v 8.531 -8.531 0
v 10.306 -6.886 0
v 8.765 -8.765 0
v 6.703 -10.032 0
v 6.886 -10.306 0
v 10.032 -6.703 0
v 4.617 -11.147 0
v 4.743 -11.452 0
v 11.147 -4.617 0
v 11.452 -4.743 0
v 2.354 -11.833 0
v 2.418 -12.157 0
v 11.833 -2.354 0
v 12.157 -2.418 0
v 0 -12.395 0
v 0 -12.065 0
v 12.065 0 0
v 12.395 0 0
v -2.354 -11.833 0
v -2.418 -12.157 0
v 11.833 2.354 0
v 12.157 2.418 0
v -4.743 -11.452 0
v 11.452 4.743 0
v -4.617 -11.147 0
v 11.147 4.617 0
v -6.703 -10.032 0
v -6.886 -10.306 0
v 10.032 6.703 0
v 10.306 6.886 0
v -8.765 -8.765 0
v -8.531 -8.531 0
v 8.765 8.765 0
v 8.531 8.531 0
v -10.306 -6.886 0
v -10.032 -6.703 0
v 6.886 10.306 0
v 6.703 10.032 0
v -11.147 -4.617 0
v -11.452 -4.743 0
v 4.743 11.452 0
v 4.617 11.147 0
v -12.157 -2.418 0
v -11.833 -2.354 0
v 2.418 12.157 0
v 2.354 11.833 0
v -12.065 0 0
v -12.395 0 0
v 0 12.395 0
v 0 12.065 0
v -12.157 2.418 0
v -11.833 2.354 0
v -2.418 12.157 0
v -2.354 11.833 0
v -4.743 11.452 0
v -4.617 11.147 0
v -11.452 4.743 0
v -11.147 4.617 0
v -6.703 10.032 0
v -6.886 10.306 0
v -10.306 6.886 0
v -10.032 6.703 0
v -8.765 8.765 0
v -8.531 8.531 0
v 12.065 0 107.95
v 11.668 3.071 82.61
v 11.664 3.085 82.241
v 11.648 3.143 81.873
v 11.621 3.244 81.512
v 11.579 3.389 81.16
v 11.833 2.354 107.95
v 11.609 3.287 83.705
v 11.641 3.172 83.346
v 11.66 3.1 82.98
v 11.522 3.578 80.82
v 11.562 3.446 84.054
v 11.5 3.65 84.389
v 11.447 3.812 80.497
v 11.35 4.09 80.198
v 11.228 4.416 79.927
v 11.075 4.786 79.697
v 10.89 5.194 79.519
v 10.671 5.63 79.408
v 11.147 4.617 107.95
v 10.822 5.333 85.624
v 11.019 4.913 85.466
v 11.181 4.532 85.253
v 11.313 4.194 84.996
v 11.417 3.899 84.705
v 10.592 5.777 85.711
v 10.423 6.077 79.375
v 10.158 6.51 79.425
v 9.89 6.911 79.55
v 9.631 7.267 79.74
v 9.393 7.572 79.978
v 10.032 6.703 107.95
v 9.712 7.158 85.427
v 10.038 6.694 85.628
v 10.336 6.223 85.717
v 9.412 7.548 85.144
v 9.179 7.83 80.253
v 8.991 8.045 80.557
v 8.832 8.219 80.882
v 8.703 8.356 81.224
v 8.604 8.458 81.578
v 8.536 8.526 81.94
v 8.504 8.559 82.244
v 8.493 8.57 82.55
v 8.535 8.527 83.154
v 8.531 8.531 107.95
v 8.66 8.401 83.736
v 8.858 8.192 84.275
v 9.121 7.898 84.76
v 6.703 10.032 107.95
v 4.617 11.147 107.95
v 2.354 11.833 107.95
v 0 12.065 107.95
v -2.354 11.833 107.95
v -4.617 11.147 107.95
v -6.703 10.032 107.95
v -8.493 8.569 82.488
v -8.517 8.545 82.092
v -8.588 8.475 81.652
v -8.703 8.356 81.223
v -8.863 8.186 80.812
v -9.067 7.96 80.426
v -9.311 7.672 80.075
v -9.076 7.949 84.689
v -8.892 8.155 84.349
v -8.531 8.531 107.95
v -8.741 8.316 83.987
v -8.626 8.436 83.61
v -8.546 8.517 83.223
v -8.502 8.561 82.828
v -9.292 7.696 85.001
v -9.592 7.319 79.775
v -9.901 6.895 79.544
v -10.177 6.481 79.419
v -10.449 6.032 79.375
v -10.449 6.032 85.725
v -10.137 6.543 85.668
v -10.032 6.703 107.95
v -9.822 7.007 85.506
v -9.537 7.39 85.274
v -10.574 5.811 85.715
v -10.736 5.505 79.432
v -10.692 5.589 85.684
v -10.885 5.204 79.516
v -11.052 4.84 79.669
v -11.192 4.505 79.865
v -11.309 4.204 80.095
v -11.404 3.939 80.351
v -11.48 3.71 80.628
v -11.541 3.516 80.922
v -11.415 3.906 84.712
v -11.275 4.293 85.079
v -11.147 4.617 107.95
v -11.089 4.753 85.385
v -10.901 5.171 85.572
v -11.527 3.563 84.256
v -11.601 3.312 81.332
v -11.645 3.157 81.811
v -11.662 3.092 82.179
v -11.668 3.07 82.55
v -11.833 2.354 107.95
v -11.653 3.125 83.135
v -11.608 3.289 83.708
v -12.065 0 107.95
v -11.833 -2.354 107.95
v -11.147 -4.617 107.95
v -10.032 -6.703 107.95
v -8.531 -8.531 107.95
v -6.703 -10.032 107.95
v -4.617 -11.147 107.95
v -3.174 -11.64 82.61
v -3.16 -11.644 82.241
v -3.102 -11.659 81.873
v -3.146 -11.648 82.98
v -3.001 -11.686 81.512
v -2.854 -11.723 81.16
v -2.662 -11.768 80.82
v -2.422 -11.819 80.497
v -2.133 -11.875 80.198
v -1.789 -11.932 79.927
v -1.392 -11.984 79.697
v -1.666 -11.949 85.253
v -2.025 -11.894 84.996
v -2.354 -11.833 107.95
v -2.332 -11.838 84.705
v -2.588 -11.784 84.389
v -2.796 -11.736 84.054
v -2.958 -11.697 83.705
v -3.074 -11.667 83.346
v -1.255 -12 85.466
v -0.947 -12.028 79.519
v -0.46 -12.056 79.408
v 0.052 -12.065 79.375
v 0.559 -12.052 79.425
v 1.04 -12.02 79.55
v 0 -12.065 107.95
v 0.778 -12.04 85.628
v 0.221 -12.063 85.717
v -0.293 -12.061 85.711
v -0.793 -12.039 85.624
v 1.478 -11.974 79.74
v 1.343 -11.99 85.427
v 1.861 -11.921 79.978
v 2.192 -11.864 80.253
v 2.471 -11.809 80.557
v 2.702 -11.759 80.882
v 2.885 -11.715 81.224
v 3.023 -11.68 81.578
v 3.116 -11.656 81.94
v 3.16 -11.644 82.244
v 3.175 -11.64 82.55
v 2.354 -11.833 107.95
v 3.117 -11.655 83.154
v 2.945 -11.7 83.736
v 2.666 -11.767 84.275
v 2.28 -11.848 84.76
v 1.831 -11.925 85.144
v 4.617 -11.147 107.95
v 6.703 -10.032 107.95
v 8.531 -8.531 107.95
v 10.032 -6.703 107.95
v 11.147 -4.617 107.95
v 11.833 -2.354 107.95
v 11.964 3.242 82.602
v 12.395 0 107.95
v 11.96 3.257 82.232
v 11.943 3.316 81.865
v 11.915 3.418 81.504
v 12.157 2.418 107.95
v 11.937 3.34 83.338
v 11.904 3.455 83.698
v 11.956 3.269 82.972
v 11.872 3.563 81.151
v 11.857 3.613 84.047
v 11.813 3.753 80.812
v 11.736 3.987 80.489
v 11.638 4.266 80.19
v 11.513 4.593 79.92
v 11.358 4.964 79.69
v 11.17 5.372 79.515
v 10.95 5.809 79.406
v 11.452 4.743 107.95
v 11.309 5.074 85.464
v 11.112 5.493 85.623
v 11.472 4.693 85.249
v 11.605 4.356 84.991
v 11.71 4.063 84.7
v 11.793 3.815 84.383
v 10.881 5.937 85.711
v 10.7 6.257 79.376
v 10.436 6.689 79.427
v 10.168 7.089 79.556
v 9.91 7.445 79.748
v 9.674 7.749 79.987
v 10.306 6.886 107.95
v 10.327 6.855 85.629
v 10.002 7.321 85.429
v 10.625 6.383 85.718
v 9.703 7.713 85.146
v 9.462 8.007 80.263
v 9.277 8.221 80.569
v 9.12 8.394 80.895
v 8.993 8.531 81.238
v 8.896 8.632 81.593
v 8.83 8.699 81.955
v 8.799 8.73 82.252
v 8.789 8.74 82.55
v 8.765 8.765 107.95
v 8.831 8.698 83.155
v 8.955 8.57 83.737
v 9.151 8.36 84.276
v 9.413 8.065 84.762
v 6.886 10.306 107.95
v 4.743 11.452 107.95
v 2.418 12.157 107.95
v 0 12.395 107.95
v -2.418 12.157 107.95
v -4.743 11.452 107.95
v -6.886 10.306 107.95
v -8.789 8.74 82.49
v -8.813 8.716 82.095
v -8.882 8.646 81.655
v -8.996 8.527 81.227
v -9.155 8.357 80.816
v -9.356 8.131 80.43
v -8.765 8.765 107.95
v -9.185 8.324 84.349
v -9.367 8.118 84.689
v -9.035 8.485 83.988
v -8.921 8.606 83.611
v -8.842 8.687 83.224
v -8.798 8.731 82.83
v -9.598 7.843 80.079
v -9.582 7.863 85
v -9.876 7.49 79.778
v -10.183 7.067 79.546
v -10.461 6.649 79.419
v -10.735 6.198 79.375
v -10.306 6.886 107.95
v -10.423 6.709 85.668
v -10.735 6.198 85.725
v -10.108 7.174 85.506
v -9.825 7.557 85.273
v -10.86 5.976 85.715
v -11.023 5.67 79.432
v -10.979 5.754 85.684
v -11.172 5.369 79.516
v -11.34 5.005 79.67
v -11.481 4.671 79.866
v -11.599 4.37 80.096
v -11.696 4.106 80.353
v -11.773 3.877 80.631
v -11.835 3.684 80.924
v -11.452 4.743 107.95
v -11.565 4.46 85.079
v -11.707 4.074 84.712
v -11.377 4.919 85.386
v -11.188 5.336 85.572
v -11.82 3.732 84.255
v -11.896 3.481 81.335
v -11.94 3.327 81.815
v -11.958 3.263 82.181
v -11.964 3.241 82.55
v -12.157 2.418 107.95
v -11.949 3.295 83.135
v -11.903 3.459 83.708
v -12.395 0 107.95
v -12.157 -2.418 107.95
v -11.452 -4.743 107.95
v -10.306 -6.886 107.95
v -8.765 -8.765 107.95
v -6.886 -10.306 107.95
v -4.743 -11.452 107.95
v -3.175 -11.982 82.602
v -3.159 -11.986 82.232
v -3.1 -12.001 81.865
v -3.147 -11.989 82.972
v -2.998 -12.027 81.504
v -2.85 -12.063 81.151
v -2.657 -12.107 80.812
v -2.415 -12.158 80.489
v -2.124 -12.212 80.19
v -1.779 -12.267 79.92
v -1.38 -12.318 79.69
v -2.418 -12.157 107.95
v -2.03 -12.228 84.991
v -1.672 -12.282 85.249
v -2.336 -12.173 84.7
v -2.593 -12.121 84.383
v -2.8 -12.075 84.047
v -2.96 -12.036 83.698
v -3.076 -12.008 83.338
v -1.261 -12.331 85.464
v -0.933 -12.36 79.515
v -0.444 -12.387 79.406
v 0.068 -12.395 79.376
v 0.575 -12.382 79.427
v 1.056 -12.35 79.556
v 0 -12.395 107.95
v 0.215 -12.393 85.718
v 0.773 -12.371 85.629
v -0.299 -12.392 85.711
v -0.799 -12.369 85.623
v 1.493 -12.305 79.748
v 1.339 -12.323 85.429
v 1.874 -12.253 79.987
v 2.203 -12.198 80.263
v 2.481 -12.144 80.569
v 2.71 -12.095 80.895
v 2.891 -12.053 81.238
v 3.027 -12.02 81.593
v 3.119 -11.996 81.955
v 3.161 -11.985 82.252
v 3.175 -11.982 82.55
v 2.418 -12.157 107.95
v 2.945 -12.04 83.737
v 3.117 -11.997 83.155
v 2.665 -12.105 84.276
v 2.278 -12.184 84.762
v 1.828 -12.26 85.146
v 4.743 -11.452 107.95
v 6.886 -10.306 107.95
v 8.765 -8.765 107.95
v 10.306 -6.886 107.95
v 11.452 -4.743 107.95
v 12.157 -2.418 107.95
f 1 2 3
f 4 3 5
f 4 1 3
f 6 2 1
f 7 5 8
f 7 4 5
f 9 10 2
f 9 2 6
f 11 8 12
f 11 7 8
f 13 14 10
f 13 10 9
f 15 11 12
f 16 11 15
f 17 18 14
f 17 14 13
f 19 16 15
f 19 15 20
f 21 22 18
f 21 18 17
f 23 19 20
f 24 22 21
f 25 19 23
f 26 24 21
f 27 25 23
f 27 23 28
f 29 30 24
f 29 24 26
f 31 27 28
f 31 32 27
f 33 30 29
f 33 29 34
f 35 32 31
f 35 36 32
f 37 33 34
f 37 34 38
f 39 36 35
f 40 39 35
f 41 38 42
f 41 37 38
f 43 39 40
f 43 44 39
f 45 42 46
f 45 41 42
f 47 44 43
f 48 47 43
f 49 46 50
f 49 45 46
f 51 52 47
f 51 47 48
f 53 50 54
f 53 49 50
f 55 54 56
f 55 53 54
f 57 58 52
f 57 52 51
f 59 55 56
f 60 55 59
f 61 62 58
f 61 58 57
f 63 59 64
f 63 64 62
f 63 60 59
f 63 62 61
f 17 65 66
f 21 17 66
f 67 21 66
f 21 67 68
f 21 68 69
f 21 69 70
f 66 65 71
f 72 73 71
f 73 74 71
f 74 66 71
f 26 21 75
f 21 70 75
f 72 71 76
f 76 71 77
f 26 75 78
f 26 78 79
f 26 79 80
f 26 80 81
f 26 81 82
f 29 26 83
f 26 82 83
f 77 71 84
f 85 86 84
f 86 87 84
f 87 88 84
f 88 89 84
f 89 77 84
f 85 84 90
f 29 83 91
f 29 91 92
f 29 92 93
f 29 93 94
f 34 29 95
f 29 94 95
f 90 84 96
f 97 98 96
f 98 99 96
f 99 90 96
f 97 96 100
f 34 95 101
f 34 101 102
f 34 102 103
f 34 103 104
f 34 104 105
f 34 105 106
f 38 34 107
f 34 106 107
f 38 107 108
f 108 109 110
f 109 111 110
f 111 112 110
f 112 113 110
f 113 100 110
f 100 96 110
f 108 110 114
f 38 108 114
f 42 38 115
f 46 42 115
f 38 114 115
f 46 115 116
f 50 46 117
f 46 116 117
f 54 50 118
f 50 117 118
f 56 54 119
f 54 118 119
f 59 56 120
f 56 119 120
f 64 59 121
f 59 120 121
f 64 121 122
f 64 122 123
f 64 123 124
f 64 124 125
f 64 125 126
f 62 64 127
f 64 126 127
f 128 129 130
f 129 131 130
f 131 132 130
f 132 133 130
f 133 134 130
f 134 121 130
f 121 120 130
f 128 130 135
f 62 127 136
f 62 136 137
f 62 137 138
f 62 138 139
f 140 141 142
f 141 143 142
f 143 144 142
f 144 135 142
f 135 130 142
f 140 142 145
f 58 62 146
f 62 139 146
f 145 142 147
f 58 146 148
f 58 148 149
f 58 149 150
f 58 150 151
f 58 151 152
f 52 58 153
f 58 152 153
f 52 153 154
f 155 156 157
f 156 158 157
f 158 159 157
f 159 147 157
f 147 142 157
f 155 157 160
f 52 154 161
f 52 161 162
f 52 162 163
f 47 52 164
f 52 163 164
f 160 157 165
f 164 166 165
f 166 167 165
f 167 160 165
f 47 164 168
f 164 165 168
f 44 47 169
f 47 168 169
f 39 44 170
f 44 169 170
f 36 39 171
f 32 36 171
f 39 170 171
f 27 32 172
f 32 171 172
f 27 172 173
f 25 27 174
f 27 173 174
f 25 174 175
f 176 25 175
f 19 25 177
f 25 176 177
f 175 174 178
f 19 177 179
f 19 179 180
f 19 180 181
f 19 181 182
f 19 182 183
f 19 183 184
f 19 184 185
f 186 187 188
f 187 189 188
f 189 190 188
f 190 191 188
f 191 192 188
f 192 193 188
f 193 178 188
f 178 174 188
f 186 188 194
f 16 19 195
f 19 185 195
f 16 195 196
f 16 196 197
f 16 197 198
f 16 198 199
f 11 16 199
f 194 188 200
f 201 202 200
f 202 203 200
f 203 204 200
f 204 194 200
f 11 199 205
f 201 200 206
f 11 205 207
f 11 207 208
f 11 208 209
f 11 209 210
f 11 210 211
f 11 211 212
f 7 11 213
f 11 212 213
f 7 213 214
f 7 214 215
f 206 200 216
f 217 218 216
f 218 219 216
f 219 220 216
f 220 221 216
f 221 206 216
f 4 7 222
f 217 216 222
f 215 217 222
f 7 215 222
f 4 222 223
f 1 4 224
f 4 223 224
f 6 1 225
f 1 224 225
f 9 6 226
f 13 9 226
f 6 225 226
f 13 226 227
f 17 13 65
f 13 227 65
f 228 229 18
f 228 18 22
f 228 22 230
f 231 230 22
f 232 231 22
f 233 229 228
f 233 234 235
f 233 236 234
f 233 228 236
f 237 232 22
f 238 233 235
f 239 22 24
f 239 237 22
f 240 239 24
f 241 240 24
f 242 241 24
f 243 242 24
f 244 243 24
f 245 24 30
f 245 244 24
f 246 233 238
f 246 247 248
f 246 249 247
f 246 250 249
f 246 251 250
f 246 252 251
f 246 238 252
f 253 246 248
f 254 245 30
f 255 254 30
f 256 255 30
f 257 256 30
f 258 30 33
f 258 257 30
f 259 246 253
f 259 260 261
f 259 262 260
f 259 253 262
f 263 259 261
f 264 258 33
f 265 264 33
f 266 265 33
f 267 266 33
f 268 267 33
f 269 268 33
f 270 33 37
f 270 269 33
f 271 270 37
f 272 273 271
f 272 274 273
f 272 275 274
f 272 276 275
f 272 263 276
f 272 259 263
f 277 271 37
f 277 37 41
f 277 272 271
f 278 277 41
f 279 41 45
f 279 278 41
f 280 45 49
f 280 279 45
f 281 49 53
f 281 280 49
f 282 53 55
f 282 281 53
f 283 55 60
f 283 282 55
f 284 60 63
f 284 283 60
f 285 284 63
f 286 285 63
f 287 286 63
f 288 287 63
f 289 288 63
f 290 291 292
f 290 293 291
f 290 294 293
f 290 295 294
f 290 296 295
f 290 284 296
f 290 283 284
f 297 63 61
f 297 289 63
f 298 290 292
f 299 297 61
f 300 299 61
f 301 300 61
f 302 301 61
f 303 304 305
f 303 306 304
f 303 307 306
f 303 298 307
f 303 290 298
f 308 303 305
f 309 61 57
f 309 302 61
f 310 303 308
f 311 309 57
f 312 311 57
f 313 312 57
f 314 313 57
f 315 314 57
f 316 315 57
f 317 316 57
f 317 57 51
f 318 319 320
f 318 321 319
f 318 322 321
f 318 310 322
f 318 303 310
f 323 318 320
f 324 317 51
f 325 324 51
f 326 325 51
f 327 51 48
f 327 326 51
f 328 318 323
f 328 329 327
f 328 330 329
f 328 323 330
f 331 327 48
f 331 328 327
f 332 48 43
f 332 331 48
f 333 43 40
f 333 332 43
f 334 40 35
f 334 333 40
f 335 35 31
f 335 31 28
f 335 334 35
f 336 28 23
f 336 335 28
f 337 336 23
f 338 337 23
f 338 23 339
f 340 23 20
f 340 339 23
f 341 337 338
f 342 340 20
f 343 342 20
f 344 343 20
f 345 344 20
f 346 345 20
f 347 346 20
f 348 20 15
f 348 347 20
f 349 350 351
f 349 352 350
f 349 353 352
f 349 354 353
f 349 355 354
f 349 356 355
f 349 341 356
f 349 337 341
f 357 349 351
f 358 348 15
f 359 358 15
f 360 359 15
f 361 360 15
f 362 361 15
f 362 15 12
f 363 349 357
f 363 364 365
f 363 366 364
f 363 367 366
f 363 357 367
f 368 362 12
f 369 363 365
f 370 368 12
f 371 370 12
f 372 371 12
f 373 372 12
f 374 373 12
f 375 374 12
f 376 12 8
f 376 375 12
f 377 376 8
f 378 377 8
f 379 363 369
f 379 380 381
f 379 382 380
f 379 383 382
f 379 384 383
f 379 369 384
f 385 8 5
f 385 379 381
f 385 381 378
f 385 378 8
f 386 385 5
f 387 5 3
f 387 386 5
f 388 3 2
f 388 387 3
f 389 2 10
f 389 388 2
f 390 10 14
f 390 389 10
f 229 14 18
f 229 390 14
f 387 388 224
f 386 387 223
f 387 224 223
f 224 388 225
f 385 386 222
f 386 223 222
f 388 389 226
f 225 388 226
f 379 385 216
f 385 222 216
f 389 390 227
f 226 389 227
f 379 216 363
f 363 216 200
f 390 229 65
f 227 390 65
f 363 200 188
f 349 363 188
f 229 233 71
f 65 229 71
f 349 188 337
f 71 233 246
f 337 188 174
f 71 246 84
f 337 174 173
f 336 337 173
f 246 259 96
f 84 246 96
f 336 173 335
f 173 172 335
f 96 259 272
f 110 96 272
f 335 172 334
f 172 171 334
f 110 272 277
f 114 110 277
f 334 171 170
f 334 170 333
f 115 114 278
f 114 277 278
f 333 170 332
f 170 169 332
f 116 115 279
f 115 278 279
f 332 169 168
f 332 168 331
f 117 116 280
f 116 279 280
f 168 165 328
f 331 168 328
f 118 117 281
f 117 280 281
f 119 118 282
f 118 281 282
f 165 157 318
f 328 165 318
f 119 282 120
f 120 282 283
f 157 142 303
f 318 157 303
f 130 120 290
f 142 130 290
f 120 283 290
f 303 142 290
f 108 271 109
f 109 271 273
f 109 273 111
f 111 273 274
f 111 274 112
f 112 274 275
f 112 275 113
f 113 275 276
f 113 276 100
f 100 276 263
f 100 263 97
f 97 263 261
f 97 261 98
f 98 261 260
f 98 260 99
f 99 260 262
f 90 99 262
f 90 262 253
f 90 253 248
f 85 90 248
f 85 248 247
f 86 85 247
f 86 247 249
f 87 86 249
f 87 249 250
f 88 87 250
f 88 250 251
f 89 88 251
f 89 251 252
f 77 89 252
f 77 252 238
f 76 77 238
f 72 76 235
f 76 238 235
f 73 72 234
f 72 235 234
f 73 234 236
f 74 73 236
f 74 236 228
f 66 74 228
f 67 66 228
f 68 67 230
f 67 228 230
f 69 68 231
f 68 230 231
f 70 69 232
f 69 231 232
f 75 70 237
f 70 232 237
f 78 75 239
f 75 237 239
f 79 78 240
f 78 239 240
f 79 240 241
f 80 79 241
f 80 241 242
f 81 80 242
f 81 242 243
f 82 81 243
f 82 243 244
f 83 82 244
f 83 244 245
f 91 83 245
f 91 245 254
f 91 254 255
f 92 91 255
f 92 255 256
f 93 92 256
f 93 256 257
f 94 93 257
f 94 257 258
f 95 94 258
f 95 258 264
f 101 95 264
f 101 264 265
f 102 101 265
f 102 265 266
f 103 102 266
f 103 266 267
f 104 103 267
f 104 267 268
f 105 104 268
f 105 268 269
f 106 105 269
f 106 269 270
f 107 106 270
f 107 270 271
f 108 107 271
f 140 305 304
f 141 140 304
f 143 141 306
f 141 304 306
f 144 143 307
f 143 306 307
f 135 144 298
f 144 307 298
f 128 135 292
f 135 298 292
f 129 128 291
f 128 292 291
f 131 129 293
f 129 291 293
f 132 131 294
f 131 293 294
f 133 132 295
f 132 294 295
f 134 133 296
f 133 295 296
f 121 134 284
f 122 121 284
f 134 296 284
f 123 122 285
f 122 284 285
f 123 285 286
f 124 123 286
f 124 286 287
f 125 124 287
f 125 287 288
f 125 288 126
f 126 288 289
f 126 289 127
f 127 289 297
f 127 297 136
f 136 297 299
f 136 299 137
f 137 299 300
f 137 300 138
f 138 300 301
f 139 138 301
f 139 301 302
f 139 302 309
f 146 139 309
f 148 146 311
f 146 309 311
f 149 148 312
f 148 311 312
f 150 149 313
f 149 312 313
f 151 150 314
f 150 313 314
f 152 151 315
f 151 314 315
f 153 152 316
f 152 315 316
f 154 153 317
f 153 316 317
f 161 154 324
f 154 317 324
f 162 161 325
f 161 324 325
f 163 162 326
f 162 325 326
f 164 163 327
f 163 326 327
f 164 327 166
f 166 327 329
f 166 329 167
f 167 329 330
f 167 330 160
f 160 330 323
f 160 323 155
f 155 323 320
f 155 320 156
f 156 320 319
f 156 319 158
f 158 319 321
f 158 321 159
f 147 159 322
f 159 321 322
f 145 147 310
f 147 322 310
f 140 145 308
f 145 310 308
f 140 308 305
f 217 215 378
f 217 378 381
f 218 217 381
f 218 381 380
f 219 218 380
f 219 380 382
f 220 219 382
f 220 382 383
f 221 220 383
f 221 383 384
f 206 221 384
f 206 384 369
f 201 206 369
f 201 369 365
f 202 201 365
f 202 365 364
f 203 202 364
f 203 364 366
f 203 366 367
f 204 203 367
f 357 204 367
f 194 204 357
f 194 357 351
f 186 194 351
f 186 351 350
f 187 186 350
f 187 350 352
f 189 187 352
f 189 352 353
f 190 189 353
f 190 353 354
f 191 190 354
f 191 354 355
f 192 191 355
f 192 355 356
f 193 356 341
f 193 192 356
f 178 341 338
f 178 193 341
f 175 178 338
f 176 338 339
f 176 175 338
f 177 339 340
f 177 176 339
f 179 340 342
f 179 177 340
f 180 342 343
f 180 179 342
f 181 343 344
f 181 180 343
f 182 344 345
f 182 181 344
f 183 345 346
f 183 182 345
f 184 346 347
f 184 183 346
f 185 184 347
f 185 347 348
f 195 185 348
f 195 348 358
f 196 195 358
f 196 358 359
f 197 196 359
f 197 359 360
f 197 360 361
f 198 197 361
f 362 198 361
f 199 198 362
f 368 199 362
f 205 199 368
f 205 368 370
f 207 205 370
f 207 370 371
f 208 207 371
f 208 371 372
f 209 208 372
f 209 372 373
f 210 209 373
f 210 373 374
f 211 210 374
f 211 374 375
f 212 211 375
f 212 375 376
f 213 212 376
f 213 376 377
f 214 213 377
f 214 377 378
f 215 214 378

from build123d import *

# Parameters (mm, degrees)
F0_W      = 0.3302
F0_H      = 107.95
F2_R      = 3.175
F3_DEPTH  = 12.3962
F6_R      = 3.175
F7_DEPTH  = 1.7554578348
F10_DEPTH = 1.7554578348


with BuildPart() as f1:
    # F0 (on Front) → F1 (revolve)
    with BuildSketch(Plane.XZ):
        with Locations((12.2301, 53.975)):
            Rectangle(F0_W, F0_H)
    revolve(axis=Axis((0, 0, 53.975), (0, 0, 1)))

    # F2 (on Front) → F3 (cut, through all)
    with BuildSketch(Plane.XZ):
        with Locations((0, 82.55)):
            Circle(F2_R)
    extrude(amount=F3_DEPTH, mode=Mode.SUBTRACT)

    # F6 (on line) → F7 (cut, up to face)
    with BuildSketch(Plane(origin=(10.734558085, 6.1976, 0), x_dir=(-0.5, 0.8660254038, 0), z_dir=(0.8660254038, 0.5, 0))):
        with Locations((0, 82.55)):
            Circle(F6_R)
    extrude(amount=-F7_DEPTH, mode=Mode.SUBTRACT)

    # F9 (on line) → F10 (cut, up to face)
    with BuildSketch(Plane(origin=(-10.734558085, 6.1976, 0), x_dir=(-0.5, -0.8660254038, 0), z_dir=(-0.8660254038, 0.5, 0))):
        with BuildLine():
            ThreePointArc((0, 85.725), (-3.175, 82.55), (0, 79.375))
            Line((0, 79.375), (0, 85.725))
        make_face()
        with BuildLine():
            Line((0, 85.725), (0, 79.375))
            ThreePointArc((0, 79.375), (2.2450640303, 80.3049359697), (3.175, 82.55))
            ThreePointArc((3.175, 82.55), (2.2450640303, 84.7950640303), (0, 85.725))
        make_face()
    extrude(amount=-F10_DEPTH, mode=Mode.SUBTRACT)


solid = f1.part
